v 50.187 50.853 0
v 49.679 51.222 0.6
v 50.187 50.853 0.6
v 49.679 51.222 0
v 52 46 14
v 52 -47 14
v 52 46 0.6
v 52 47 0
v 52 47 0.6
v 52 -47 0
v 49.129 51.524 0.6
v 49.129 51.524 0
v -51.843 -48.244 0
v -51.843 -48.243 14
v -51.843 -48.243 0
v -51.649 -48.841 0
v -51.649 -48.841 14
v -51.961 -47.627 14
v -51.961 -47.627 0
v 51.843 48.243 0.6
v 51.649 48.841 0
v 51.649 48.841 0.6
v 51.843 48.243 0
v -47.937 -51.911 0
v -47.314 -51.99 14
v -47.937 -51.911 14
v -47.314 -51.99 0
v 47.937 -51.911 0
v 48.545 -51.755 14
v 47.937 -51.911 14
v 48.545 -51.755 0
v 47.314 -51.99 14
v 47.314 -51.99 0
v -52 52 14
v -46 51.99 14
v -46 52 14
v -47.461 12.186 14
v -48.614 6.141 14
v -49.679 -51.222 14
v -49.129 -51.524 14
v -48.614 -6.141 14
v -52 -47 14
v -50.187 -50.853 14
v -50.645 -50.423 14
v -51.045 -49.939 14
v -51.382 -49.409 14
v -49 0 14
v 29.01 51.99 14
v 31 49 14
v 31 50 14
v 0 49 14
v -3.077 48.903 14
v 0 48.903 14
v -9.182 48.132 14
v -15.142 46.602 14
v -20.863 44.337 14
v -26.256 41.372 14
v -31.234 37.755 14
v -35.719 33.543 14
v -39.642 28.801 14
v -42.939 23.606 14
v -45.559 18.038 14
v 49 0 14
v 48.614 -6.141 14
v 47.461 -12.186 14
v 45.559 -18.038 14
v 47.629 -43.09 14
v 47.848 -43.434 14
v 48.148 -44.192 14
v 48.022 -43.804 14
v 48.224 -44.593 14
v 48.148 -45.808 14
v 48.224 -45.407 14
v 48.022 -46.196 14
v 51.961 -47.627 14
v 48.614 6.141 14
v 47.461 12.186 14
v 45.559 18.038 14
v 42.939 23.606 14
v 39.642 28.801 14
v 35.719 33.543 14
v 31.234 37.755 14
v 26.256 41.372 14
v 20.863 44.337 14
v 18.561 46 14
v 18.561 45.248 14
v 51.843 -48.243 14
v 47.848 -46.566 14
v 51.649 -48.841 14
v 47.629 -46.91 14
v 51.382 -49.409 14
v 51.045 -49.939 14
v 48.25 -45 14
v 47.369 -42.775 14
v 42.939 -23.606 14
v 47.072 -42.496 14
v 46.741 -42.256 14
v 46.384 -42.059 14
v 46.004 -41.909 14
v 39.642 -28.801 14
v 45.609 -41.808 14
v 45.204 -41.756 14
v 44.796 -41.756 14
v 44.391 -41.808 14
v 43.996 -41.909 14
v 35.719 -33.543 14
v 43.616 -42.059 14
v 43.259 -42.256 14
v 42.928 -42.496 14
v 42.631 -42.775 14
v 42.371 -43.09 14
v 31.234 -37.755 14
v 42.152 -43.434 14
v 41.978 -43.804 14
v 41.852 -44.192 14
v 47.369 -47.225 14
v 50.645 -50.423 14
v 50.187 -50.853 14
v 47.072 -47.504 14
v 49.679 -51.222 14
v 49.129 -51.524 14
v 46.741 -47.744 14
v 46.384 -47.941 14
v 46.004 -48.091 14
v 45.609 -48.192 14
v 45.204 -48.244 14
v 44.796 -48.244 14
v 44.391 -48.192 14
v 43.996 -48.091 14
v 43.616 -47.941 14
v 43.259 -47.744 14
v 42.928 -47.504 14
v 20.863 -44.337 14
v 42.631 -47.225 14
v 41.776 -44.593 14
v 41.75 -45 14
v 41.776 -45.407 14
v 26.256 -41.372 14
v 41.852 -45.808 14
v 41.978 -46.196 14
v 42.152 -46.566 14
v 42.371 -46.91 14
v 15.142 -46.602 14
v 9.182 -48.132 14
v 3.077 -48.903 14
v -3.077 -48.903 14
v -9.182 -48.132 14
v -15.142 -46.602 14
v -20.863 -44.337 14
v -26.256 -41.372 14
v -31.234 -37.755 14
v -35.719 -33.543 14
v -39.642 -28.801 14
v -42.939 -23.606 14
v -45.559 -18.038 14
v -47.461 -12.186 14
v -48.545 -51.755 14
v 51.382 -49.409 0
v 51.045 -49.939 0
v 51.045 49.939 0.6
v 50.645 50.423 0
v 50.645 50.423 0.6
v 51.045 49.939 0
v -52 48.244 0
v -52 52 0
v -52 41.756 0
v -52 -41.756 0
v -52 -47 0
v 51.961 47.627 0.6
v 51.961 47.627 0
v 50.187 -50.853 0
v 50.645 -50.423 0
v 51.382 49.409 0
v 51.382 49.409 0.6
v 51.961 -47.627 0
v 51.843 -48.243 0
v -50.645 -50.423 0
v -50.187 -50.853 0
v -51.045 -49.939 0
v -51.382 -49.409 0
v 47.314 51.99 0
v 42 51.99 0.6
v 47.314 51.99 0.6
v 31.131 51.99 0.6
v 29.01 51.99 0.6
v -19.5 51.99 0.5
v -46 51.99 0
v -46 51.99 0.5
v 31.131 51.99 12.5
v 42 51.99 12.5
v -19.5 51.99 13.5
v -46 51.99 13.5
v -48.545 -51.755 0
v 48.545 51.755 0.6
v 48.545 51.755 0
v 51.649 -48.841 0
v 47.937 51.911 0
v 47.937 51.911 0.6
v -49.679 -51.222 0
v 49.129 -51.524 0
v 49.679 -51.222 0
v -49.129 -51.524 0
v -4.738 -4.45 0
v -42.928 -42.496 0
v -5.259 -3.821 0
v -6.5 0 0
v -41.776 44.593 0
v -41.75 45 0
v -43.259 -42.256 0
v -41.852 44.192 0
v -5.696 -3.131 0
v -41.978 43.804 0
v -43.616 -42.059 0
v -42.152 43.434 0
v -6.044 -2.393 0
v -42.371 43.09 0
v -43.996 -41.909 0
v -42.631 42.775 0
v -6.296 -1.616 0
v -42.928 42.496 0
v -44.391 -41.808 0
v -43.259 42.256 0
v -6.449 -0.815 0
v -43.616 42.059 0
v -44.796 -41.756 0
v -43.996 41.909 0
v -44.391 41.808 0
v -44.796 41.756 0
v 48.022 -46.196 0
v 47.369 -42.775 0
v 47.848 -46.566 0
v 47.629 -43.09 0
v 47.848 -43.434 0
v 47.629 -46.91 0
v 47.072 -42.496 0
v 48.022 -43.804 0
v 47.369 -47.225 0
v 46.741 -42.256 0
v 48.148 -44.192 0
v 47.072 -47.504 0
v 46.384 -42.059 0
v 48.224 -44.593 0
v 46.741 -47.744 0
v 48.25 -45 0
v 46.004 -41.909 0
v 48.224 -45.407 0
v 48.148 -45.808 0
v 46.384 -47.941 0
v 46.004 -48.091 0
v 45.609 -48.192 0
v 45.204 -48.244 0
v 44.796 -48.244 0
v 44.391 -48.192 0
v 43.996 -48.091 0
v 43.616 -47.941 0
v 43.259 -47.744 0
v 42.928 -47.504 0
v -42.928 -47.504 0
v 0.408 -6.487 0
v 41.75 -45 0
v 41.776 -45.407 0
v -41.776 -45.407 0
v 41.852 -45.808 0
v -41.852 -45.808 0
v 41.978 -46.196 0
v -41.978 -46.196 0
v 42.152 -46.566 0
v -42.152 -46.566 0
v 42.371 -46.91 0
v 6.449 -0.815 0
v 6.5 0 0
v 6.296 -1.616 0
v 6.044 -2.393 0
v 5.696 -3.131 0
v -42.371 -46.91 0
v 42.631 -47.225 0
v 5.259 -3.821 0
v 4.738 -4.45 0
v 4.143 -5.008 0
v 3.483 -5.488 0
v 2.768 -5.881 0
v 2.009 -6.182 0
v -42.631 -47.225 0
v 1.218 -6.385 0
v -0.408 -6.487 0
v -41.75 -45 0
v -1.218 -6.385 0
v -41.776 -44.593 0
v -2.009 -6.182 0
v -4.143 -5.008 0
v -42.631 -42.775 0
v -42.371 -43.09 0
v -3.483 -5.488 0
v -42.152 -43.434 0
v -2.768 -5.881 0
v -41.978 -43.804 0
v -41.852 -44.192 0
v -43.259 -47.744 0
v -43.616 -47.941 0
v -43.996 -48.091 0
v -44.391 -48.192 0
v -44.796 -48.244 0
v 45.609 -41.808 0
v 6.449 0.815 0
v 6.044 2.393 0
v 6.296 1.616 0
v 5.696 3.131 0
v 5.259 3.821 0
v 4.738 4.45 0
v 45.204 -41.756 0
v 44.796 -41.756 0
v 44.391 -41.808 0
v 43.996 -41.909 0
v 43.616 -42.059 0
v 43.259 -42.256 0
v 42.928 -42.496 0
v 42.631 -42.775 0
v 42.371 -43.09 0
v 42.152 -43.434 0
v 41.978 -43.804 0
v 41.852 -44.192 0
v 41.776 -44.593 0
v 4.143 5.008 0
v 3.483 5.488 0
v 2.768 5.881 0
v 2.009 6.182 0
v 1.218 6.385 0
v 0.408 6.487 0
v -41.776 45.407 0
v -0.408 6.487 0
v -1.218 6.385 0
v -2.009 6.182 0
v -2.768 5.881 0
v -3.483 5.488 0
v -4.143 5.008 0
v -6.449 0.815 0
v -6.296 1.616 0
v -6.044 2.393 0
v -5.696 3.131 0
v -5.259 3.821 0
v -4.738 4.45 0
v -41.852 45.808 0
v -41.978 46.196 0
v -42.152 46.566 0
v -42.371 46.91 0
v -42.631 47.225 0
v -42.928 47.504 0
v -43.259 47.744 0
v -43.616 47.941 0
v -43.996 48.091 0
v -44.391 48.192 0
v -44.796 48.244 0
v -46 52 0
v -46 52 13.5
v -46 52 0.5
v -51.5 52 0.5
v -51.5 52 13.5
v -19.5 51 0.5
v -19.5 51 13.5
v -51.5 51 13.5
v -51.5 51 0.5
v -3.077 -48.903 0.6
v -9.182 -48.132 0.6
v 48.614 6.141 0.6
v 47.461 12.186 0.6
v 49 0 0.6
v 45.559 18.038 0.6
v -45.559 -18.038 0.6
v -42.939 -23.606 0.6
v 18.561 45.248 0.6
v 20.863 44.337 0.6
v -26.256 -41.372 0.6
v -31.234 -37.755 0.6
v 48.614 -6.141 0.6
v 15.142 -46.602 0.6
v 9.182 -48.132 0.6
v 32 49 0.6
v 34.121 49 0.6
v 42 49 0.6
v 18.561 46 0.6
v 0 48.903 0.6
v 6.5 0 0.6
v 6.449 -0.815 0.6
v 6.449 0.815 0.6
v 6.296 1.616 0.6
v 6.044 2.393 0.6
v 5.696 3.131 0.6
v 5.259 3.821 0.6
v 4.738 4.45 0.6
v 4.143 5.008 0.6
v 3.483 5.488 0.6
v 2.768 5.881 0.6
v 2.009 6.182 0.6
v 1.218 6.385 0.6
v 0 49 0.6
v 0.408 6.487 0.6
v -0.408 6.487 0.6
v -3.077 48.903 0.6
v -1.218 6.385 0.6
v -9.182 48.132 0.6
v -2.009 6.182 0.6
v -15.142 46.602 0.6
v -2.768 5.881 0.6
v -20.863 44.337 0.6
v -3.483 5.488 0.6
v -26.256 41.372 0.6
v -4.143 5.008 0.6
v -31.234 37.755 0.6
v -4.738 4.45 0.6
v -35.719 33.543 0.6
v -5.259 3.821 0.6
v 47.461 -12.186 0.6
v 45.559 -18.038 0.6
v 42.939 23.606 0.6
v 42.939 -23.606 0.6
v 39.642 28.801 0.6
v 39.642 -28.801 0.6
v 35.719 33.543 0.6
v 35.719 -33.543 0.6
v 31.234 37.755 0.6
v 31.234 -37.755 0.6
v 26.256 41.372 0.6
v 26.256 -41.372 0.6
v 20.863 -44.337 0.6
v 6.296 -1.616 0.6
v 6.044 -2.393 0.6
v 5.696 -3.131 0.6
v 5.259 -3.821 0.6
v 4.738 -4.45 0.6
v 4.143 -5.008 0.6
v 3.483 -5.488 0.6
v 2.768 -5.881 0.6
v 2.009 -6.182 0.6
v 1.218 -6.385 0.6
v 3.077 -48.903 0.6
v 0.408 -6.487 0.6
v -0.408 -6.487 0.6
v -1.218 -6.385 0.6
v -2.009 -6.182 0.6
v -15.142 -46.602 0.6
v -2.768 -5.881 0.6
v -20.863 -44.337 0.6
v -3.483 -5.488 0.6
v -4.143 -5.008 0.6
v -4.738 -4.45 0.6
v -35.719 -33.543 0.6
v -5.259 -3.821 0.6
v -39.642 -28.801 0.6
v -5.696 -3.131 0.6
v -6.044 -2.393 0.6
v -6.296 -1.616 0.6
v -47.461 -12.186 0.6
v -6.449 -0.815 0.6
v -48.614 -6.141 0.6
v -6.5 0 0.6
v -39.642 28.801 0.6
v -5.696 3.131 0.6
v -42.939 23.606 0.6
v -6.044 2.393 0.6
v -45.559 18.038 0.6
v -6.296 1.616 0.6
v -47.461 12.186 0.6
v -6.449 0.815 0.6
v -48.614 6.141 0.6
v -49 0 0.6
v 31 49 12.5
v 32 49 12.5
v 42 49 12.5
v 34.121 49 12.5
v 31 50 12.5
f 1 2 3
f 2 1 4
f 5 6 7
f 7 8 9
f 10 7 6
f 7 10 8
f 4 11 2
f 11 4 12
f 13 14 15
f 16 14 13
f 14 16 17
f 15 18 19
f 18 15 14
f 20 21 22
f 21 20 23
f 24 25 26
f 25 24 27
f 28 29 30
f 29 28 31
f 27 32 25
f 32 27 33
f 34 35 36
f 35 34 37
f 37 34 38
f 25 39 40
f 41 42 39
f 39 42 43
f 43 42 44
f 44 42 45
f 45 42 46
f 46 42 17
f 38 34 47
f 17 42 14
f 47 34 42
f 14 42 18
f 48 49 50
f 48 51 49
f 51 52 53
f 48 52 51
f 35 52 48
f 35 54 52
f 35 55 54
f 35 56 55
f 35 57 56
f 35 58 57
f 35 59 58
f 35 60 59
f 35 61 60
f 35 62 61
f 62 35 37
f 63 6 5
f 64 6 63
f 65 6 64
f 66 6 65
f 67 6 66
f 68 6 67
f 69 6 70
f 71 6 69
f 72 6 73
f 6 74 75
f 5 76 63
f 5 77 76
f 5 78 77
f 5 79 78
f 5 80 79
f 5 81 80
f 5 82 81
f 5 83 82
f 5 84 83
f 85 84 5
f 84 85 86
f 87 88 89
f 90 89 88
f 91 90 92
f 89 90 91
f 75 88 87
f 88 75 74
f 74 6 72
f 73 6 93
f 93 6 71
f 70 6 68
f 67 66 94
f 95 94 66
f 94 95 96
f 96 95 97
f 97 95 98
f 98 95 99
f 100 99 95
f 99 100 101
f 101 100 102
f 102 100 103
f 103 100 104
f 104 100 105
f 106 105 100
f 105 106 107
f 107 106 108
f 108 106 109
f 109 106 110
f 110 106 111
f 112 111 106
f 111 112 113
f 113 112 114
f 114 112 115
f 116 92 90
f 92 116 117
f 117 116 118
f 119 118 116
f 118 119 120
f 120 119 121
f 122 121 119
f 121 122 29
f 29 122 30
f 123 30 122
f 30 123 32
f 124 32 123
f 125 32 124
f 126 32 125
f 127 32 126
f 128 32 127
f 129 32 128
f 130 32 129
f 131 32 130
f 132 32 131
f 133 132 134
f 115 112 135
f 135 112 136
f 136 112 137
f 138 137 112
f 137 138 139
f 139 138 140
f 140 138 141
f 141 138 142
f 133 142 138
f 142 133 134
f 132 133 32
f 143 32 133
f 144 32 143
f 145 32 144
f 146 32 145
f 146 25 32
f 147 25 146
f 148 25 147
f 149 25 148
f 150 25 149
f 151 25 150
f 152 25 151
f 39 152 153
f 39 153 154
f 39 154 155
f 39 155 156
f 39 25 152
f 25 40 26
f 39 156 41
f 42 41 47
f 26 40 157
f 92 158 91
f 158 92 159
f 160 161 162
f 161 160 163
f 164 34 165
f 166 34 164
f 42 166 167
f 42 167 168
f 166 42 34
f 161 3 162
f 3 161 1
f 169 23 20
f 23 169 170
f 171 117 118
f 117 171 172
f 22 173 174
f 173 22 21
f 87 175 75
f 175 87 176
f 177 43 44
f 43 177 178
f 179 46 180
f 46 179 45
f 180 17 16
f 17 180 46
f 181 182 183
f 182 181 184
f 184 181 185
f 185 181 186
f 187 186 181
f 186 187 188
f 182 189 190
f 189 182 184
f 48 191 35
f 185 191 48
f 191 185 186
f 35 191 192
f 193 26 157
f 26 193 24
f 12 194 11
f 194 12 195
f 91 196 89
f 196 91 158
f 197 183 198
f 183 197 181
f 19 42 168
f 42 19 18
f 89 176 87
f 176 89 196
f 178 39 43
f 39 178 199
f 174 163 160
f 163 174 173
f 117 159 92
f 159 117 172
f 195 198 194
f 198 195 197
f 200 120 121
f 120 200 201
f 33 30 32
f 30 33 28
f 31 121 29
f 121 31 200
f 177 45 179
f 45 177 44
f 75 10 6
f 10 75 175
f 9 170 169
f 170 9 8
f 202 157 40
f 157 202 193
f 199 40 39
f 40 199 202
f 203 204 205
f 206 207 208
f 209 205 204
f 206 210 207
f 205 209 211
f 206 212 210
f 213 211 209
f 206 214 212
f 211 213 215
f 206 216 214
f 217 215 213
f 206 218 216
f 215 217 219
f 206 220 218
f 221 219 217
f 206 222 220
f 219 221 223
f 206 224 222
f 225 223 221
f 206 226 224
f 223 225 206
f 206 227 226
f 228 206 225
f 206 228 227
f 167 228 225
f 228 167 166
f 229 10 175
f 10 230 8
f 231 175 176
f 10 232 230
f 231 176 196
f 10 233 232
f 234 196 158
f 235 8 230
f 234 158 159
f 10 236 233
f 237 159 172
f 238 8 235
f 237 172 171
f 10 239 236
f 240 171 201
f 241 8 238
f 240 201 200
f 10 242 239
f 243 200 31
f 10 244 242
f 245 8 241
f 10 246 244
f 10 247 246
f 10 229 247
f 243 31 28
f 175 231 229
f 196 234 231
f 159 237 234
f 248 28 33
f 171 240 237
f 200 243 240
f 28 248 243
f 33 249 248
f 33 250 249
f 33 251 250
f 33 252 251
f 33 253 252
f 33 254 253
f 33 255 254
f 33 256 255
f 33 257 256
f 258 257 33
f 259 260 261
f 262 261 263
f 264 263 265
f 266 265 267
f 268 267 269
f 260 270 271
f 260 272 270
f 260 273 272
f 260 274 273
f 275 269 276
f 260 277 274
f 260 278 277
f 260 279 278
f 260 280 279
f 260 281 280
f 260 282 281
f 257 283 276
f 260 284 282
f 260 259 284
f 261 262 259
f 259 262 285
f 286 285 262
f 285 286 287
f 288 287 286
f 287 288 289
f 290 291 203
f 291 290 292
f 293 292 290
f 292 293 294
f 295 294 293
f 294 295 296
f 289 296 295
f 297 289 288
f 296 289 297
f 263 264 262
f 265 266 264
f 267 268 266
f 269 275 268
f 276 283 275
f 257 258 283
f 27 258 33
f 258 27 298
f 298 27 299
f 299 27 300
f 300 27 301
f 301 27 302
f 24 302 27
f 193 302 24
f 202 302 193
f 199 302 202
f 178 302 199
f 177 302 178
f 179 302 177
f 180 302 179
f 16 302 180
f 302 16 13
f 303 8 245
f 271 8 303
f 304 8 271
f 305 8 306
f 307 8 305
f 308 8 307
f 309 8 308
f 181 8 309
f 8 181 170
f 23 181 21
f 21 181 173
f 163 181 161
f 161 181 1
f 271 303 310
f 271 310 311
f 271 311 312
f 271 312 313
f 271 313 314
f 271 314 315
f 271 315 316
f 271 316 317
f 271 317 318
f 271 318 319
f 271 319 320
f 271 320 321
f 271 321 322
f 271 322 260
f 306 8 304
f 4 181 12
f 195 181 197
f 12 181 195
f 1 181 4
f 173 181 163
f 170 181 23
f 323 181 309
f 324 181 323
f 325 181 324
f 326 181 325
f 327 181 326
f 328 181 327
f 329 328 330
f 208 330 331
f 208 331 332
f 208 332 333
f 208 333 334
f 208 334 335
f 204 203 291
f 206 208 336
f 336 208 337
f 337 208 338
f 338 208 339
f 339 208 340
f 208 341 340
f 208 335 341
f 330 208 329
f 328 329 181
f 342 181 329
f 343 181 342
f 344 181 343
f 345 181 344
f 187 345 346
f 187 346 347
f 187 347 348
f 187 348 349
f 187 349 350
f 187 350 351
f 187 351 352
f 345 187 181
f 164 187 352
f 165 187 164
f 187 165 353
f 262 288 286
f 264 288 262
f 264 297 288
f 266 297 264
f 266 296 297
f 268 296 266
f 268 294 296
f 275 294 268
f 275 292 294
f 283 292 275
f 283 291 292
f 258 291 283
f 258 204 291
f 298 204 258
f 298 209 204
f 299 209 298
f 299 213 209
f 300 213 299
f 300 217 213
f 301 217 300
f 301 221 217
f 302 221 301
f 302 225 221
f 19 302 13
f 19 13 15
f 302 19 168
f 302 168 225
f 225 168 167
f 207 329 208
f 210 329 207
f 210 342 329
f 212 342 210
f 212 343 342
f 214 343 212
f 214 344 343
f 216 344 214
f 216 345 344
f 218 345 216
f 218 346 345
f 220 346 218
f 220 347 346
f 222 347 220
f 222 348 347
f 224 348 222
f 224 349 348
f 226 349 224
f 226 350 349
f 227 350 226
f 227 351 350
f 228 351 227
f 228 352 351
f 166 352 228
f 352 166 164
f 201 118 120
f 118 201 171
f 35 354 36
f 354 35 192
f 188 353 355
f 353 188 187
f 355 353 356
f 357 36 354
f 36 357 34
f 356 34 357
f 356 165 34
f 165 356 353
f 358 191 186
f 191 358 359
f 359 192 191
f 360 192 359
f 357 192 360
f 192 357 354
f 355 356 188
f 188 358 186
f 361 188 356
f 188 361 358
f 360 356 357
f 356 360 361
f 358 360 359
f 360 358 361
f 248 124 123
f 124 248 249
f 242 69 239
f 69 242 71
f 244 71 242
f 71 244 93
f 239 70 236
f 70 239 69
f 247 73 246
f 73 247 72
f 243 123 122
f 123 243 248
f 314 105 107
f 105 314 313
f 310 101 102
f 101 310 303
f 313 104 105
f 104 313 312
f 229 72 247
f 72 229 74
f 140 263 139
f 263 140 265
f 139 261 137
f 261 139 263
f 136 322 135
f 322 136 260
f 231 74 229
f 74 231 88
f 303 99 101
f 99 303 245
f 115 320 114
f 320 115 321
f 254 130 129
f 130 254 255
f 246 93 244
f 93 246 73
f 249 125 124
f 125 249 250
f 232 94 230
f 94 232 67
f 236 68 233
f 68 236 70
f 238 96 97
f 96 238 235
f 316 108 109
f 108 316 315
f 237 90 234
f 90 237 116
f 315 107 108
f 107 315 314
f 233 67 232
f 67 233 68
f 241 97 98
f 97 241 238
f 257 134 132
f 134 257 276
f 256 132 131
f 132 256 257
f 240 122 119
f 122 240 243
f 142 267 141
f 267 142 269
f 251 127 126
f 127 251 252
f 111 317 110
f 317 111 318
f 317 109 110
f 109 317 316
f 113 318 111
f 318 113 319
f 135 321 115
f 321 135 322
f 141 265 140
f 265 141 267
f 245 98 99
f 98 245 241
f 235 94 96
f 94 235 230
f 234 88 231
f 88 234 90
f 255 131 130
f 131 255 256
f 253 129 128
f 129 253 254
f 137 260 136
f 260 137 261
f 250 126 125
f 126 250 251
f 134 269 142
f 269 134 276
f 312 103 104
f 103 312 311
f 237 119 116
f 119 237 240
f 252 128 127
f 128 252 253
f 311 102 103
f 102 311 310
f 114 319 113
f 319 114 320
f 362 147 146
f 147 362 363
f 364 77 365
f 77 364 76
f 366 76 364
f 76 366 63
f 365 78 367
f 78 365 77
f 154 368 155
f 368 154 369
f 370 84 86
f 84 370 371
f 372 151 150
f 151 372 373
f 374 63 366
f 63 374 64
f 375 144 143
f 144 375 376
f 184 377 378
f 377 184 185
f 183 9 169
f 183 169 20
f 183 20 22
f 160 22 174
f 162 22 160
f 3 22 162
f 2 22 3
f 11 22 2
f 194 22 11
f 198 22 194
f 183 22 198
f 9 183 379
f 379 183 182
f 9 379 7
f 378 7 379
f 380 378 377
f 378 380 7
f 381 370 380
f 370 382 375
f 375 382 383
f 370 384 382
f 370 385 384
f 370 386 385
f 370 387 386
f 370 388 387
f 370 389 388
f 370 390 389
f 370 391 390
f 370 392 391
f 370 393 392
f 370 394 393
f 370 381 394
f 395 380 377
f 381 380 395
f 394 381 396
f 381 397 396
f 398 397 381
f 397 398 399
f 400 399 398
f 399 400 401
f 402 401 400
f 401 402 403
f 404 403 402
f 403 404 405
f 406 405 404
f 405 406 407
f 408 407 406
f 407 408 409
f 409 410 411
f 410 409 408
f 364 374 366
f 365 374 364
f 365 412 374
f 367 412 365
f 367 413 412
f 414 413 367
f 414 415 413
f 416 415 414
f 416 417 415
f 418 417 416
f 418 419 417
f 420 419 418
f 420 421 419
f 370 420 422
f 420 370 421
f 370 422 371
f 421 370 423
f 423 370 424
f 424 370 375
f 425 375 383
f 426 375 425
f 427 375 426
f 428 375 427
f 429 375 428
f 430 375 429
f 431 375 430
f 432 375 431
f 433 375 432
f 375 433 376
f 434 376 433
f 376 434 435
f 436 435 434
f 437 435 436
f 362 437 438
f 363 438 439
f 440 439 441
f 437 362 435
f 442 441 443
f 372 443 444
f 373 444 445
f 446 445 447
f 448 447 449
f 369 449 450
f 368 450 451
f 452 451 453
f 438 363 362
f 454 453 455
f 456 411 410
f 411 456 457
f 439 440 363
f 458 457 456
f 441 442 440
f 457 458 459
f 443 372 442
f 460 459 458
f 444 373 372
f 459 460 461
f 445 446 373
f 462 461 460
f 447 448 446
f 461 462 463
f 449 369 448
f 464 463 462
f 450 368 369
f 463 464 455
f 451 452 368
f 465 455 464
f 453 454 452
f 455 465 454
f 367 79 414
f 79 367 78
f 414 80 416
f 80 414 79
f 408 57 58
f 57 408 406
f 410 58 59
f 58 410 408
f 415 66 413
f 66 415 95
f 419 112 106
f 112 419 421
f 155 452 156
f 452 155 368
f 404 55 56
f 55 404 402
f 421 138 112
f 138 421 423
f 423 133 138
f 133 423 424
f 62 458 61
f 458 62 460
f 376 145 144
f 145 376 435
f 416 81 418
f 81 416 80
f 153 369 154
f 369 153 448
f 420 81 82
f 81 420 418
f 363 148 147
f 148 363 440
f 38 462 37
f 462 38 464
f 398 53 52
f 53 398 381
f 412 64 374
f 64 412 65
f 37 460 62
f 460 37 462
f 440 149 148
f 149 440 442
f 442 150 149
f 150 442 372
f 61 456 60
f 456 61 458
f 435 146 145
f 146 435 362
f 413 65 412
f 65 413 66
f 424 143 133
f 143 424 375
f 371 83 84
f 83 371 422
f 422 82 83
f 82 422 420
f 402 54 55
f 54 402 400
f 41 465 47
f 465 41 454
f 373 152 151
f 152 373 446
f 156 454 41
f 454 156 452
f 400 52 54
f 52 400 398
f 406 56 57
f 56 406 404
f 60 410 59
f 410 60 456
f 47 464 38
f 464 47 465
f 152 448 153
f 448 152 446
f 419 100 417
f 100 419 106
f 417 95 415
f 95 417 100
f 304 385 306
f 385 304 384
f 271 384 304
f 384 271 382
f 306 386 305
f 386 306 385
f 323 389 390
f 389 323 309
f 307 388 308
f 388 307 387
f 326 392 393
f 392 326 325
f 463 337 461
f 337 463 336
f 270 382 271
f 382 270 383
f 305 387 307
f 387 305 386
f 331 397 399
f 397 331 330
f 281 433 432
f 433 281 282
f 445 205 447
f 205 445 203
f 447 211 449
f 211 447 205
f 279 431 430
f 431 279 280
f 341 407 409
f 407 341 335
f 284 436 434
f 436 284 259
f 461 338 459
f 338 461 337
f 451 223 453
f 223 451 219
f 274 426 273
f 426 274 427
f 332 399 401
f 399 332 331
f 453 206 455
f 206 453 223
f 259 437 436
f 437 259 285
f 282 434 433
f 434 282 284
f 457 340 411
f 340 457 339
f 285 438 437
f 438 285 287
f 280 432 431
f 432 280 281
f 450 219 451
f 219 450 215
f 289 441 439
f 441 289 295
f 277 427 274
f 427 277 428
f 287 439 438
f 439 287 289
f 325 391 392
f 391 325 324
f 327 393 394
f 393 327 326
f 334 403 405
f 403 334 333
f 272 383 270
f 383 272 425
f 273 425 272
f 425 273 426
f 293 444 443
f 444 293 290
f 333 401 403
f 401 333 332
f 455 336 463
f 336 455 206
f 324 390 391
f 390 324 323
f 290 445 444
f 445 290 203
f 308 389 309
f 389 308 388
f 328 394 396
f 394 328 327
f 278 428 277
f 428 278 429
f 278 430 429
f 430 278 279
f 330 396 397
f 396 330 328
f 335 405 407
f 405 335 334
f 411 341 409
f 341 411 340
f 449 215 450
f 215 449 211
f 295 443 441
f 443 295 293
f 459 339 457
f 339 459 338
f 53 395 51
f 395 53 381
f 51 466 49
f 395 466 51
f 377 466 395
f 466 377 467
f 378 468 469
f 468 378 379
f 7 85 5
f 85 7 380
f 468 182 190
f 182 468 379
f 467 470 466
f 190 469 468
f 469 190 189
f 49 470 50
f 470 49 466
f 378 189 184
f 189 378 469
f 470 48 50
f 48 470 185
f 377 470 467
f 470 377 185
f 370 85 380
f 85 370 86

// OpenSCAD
$fn = 50;


difference() {
	union() {
		hull() {
			translate(v = [-47.0000000000, 47.0000000000, 0]) {
				cylinder(h = 14, r = 5);
			}
			translate(v = [47.0000000000, 47.0000000000, 0]) {
				cylinder(h = 14, r = 5);
			}
			translate(v = [-47.0000000000, -47.0000000000, 0]) {
				cylinder(h = 14, r = 5);
			}
			translate(v = [47.0000000000, -47.0000000000, 0]) {
				cylinder(h = 14, r = 5);
			}
		}
		translate(v = [-52.0000000000, 46.0000000000, 0]) {
			cube(size = [6, 6, 14]);
		}
	}
	union() {
		translate(v = [-52.5000000000, -45.0000000000, -250.0000000000]) {
			rotate(a = [0, 0, 0]) {
				difference() {
					union() {
						hull() {
							translate(v = [7.5000000000, 0, 0]) {
								cylinder(h = 250, r = 3.2500000000, r1 = 3.2500000000, r2 = 3.2500000000);
							}
							translate(v = [-7.5000000000, 0, 0]) {
								cylinder(h = 250, r = 3.2500000000, r1 = 3.2500000000, r2 = 3.2500000000);
							}
						}
					}
					union();
				}
			}
		}
		translate(v = [-52.5000000000, 45.0000000000, -250.0000000000]) {
			rotate(a = [0, 0, 0]) {
				difference() {
					union() {
						hull() {
							translate(v = [7.5000000000, 0, 0]) {
								cylinder(h = 250, r = 3.2500000000, r1 = 3.2500000000, r2 = 3.2500000000);
							}
							translate(v = [-7.5000000000, 0, 0]) {
								cylinder(h = 250, r = 3.2500000000, r1 = 3.2500000000, r2 = 3.2500000000);
							}
						}
					}
					union();
				}
			}
		}
		translate(v = [-51.5000000000, 51.0000000000, 0.5000000000]) {
			cube(size = [32, 1, 13.0000000000]);
		}
		translate(v = [45.0000000000, -45.0000000000, -50.0000000000]) {
			cylinder(h = 100, r = 3.2500000000);
		}
		translate(v = [0, 0, 0.6000000000]) {
			cylinder(h = 16.4000000000, r = 49.0000000000);
		}
		translate(v = [0, 0, -7.0000000000]) {
			cylinder(h = 14, r = 6.5000000000);
		}
		translate(v = [0.0000000000, 46.0000000000, 0.6000000000]) {
			cube(size = [52.0000000000, 3, 16.4000000000]);
		}
		translate(v = [42.0000000000, 46.0000000000, 0.6000000000]) {
			cube(size = [10, 6, 16.4000000000]);
		}
		translate(v = [31.0000000000, 46.0000000000, 12.5000000000]) {
			cube(size = [21, 6, 1.5000000000]);
		}
		translate(v = [28.2500000000, 52.7500000000, 0.6000000000]) {
			rotate(a = [0, 0, -45]) {
				cube(size = [7.5000000000, 1.5000000000, 16.4000000000]);
			}
		}
		translate(v = [11.0610000000, 44.0000000000, 0.6000000000]) {
			cube(size = [7.5000000000, 2, 13.4000000000]);
		}
	}
}
